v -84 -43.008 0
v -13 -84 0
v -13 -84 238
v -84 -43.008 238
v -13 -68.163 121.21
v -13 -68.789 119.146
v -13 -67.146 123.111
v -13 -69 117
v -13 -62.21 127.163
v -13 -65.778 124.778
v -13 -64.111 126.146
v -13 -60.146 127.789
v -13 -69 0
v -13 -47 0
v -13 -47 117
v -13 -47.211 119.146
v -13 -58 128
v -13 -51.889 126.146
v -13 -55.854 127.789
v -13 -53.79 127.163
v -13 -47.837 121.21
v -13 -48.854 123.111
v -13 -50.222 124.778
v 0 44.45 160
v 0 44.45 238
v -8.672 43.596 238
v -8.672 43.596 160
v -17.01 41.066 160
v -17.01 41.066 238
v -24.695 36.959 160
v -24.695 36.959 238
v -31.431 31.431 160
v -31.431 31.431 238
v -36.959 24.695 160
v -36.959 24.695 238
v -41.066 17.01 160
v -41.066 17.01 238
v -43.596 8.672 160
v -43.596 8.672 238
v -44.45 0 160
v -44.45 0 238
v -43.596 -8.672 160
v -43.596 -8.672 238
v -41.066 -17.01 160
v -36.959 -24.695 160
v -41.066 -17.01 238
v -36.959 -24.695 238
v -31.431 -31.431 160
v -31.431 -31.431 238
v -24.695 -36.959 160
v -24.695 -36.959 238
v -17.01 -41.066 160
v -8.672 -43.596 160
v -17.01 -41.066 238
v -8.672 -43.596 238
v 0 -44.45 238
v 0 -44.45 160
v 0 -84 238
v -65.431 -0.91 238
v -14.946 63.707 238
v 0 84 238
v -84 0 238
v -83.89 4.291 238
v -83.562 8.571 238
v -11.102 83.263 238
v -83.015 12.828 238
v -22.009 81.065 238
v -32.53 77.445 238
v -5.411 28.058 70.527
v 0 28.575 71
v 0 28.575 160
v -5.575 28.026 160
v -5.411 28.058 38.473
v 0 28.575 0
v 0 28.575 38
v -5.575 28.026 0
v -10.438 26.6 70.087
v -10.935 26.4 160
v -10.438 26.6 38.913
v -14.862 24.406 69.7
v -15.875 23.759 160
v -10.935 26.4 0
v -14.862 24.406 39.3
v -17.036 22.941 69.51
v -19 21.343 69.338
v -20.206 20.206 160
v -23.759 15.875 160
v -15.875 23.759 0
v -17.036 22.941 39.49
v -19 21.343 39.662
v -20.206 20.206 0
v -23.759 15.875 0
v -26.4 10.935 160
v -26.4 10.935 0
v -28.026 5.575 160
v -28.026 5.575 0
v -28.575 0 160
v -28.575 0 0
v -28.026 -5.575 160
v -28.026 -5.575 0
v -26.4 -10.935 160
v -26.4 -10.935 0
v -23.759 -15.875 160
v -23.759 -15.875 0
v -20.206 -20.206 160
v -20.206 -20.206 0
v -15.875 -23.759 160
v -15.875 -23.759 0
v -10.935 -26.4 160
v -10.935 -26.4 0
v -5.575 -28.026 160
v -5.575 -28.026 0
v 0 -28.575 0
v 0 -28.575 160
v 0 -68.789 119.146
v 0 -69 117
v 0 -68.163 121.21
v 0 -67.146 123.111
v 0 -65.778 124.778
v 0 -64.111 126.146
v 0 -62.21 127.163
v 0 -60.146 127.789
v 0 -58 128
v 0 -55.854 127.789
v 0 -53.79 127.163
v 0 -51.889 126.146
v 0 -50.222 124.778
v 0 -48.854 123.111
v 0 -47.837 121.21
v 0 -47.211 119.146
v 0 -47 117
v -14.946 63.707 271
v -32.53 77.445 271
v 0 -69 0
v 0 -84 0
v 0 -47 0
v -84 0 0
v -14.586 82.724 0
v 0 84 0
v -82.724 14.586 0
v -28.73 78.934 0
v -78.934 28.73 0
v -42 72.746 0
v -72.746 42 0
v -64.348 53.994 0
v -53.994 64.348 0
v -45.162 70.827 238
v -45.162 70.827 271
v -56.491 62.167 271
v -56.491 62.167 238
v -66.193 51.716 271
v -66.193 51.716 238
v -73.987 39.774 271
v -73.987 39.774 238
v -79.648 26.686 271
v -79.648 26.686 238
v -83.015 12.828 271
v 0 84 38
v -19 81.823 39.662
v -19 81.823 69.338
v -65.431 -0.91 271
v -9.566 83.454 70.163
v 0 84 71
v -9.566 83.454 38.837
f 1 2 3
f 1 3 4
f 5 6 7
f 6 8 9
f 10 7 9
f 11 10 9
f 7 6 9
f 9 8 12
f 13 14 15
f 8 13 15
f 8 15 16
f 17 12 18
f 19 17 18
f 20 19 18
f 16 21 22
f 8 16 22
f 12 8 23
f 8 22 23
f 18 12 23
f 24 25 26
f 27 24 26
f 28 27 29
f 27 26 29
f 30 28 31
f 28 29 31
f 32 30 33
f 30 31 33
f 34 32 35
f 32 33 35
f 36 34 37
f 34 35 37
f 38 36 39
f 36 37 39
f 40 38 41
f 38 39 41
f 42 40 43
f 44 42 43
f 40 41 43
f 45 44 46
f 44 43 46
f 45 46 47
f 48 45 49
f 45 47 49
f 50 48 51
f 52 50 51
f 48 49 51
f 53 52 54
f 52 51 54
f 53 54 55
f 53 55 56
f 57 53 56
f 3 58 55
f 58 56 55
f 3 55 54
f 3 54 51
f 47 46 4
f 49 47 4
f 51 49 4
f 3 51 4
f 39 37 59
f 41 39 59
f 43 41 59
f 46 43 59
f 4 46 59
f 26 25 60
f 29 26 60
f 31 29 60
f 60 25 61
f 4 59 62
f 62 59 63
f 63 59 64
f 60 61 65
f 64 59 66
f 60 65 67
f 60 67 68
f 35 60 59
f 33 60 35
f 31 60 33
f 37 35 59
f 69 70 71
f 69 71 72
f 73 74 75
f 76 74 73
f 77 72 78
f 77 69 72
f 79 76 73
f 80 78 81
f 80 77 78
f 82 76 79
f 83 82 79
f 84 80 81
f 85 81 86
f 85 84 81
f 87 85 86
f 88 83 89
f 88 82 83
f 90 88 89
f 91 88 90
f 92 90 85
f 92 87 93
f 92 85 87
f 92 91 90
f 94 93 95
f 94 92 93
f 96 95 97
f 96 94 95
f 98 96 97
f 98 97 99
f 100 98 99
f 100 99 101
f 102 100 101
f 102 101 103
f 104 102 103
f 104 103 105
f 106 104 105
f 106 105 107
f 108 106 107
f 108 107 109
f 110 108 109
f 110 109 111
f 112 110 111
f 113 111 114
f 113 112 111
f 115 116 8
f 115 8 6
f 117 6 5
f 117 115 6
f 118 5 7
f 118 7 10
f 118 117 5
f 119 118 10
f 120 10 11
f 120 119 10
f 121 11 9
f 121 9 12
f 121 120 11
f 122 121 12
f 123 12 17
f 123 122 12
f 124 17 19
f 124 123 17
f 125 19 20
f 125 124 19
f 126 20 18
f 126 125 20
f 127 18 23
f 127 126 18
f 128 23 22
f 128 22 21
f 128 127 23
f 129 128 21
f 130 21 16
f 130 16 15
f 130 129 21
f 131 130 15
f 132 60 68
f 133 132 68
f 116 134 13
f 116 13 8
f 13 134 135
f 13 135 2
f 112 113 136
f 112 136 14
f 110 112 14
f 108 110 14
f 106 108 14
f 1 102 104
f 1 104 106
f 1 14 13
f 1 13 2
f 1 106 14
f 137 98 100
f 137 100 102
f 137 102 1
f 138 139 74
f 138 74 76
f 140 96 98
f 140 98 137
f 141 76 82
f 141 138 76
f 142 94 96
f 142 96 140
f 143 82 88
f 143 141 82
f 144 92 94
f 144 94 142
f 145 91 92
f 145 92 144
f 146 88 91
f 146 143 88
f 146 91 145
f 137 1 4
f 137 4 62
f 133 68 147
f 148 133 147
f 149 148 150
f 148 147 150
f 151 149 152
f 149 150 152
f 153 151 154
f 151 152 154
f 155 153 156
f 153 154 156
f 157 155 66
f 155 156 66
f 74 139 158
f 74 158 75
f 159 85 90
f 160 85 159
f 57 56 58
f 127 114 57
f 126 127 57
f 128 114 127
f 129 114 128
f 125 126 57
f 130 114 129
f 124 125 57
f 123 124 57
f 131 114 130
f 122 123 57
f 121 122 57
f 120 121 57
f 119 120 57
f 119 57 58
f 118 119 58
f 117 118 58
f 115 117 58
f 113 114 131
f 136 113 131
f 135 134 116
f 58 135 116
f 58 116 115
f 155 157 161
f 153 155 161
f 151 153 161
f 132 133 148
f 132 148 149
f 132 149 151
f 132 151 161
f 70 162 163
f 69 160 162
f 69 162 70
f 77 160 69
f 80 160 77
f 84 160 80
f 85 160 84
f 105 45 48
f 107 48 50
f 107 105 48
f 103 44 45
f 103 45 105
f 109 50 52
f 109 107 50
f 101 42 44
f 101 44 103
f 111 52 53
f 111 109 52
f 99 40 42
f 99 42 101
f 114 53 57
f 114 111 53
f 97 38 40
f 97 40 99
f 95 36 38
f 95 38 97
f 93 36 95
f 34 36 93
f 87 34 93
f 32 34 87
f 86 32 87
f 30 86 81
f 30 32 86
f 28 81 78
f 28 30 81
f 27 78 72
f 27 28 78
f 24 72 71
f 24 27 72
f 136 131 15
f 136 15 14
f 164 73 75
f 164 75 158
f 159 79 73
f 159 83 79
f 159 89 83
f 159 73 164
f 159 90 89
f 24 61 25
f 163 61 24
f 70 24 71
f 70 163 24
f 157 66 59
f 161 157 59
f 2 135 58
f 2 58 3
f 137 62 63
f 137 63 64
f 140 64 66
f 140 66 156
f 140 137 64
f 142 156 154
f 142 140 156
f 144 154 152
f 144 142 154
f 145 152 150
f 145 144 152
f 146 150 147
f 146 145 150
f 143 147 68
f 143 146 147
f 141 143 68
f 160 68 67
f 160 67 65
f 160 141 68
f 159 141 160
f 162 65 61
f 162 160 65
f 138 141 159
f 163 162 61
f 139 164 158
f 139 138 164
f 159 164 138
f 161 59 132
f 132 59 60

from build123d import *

# Parameters (mm, degrees)
BOSS_EXTRUDE1_DEPTH = 238
SKETCH6_R           = 44.45
CUT_EXTRUDE1_DEPTH  = 78
SKETCH7_W           = 33
SKETCH7_H           = 85
CUT_EXTRUDE2_DEPTH  = 19
CUT_EXTRUDE2_TAPER  = 5
CUT_EXTRUDE3_DEPTH  = 13
BOSS_EXTRUDE2_DEPTH = 33


with BuildPart() as part:
    # Sketch5 → Boss-Extrude1 (new body)
    with BuildSketch(Plane.XY):
        with BuildLine():
            Line((-84, -43.008130888), (-84, 0))
            ThreePointArc((-84, 0), (-59.39696962, 59.39696962), (0, 84))
            Line((0, 84), (0, 28.575))
            ThreePointArc((0, 28.575), (-28.575, 0), (0, -28.575))
            Line((0, -28.575), (0, -84))
            Line((0, -84), (-13, -84))
            Line((-13, -84), (-84, -43.008130888))
        make_face()
    extrude(amount=BOSS_EXTRUDE1_DEPTH)

    # Sketch6 → Cut-Extrude1 (cut)
    with BuildSketch(Plane.XY.offset(238)):
        Circle(SKETCH6_R)
    extrude(amount=-CUT_EXTRUDE1_DEPTH, mode=Mode.SUBTRACT)

    # Sketch7 → Cut-Extrude2 (cut)
    with BuildSketch(Plane(origin=(0, 0, 0), x_dir=(0, 0, -1), z_dir=(1, 0, 0))):
        with Locations((-54.5, 43.5)):
            Rectangle(SKETCH7_W, SKETCH7_H)
    extrude(amount=-CUT_EXTRUDE2_DEPTH, taper=CUT_EXTRUDE2_TAPER, mode=Mode.SUBTRACT)

    # Sketch8 → Cut-Extrude3 (cut)
    with BuildSketch(Plane(origin=(0, 0, 0), x_dir=(0, 0, -1), z_dir=(1, 0, 0))):
        with BuildLine():
            Line((-117, -47), (66, -47))
            ThreePointArc((66, -47), (77, -58), (66, -69))
            Line((66, -69), (-117, -69))
            ThreePointArc((-117, -69), (-128, -58), (-117, -47))
        make_face()
    extrude(amount=-CUT_EXTRUDE3_DEPTH, mode=Mode.SUBTRACT)

    # Sketch9 → Boss-Extrude2 (add)
    with BuildSketch(Plane.XY.offset(238)):
        with BuildLine():
            Line((-83.014649379, 12.828405531), (-65.430668922, -0.909705656))
            Line((-65.430668922, -0.909705656), (-14.946427946, 63.707176139))
            Line((-14.946427946, 63.707176139), (-32.530408402, 77.445287327))
            ThreePointArc((-32.530408402, 77.445287327), (-66.192903303, 51.715563927), (-83.014649379, 12.828405531))
        make_face()
    extrude(amount=BOSS_EXTRUDE2_DEPTH)


solid = part.part
